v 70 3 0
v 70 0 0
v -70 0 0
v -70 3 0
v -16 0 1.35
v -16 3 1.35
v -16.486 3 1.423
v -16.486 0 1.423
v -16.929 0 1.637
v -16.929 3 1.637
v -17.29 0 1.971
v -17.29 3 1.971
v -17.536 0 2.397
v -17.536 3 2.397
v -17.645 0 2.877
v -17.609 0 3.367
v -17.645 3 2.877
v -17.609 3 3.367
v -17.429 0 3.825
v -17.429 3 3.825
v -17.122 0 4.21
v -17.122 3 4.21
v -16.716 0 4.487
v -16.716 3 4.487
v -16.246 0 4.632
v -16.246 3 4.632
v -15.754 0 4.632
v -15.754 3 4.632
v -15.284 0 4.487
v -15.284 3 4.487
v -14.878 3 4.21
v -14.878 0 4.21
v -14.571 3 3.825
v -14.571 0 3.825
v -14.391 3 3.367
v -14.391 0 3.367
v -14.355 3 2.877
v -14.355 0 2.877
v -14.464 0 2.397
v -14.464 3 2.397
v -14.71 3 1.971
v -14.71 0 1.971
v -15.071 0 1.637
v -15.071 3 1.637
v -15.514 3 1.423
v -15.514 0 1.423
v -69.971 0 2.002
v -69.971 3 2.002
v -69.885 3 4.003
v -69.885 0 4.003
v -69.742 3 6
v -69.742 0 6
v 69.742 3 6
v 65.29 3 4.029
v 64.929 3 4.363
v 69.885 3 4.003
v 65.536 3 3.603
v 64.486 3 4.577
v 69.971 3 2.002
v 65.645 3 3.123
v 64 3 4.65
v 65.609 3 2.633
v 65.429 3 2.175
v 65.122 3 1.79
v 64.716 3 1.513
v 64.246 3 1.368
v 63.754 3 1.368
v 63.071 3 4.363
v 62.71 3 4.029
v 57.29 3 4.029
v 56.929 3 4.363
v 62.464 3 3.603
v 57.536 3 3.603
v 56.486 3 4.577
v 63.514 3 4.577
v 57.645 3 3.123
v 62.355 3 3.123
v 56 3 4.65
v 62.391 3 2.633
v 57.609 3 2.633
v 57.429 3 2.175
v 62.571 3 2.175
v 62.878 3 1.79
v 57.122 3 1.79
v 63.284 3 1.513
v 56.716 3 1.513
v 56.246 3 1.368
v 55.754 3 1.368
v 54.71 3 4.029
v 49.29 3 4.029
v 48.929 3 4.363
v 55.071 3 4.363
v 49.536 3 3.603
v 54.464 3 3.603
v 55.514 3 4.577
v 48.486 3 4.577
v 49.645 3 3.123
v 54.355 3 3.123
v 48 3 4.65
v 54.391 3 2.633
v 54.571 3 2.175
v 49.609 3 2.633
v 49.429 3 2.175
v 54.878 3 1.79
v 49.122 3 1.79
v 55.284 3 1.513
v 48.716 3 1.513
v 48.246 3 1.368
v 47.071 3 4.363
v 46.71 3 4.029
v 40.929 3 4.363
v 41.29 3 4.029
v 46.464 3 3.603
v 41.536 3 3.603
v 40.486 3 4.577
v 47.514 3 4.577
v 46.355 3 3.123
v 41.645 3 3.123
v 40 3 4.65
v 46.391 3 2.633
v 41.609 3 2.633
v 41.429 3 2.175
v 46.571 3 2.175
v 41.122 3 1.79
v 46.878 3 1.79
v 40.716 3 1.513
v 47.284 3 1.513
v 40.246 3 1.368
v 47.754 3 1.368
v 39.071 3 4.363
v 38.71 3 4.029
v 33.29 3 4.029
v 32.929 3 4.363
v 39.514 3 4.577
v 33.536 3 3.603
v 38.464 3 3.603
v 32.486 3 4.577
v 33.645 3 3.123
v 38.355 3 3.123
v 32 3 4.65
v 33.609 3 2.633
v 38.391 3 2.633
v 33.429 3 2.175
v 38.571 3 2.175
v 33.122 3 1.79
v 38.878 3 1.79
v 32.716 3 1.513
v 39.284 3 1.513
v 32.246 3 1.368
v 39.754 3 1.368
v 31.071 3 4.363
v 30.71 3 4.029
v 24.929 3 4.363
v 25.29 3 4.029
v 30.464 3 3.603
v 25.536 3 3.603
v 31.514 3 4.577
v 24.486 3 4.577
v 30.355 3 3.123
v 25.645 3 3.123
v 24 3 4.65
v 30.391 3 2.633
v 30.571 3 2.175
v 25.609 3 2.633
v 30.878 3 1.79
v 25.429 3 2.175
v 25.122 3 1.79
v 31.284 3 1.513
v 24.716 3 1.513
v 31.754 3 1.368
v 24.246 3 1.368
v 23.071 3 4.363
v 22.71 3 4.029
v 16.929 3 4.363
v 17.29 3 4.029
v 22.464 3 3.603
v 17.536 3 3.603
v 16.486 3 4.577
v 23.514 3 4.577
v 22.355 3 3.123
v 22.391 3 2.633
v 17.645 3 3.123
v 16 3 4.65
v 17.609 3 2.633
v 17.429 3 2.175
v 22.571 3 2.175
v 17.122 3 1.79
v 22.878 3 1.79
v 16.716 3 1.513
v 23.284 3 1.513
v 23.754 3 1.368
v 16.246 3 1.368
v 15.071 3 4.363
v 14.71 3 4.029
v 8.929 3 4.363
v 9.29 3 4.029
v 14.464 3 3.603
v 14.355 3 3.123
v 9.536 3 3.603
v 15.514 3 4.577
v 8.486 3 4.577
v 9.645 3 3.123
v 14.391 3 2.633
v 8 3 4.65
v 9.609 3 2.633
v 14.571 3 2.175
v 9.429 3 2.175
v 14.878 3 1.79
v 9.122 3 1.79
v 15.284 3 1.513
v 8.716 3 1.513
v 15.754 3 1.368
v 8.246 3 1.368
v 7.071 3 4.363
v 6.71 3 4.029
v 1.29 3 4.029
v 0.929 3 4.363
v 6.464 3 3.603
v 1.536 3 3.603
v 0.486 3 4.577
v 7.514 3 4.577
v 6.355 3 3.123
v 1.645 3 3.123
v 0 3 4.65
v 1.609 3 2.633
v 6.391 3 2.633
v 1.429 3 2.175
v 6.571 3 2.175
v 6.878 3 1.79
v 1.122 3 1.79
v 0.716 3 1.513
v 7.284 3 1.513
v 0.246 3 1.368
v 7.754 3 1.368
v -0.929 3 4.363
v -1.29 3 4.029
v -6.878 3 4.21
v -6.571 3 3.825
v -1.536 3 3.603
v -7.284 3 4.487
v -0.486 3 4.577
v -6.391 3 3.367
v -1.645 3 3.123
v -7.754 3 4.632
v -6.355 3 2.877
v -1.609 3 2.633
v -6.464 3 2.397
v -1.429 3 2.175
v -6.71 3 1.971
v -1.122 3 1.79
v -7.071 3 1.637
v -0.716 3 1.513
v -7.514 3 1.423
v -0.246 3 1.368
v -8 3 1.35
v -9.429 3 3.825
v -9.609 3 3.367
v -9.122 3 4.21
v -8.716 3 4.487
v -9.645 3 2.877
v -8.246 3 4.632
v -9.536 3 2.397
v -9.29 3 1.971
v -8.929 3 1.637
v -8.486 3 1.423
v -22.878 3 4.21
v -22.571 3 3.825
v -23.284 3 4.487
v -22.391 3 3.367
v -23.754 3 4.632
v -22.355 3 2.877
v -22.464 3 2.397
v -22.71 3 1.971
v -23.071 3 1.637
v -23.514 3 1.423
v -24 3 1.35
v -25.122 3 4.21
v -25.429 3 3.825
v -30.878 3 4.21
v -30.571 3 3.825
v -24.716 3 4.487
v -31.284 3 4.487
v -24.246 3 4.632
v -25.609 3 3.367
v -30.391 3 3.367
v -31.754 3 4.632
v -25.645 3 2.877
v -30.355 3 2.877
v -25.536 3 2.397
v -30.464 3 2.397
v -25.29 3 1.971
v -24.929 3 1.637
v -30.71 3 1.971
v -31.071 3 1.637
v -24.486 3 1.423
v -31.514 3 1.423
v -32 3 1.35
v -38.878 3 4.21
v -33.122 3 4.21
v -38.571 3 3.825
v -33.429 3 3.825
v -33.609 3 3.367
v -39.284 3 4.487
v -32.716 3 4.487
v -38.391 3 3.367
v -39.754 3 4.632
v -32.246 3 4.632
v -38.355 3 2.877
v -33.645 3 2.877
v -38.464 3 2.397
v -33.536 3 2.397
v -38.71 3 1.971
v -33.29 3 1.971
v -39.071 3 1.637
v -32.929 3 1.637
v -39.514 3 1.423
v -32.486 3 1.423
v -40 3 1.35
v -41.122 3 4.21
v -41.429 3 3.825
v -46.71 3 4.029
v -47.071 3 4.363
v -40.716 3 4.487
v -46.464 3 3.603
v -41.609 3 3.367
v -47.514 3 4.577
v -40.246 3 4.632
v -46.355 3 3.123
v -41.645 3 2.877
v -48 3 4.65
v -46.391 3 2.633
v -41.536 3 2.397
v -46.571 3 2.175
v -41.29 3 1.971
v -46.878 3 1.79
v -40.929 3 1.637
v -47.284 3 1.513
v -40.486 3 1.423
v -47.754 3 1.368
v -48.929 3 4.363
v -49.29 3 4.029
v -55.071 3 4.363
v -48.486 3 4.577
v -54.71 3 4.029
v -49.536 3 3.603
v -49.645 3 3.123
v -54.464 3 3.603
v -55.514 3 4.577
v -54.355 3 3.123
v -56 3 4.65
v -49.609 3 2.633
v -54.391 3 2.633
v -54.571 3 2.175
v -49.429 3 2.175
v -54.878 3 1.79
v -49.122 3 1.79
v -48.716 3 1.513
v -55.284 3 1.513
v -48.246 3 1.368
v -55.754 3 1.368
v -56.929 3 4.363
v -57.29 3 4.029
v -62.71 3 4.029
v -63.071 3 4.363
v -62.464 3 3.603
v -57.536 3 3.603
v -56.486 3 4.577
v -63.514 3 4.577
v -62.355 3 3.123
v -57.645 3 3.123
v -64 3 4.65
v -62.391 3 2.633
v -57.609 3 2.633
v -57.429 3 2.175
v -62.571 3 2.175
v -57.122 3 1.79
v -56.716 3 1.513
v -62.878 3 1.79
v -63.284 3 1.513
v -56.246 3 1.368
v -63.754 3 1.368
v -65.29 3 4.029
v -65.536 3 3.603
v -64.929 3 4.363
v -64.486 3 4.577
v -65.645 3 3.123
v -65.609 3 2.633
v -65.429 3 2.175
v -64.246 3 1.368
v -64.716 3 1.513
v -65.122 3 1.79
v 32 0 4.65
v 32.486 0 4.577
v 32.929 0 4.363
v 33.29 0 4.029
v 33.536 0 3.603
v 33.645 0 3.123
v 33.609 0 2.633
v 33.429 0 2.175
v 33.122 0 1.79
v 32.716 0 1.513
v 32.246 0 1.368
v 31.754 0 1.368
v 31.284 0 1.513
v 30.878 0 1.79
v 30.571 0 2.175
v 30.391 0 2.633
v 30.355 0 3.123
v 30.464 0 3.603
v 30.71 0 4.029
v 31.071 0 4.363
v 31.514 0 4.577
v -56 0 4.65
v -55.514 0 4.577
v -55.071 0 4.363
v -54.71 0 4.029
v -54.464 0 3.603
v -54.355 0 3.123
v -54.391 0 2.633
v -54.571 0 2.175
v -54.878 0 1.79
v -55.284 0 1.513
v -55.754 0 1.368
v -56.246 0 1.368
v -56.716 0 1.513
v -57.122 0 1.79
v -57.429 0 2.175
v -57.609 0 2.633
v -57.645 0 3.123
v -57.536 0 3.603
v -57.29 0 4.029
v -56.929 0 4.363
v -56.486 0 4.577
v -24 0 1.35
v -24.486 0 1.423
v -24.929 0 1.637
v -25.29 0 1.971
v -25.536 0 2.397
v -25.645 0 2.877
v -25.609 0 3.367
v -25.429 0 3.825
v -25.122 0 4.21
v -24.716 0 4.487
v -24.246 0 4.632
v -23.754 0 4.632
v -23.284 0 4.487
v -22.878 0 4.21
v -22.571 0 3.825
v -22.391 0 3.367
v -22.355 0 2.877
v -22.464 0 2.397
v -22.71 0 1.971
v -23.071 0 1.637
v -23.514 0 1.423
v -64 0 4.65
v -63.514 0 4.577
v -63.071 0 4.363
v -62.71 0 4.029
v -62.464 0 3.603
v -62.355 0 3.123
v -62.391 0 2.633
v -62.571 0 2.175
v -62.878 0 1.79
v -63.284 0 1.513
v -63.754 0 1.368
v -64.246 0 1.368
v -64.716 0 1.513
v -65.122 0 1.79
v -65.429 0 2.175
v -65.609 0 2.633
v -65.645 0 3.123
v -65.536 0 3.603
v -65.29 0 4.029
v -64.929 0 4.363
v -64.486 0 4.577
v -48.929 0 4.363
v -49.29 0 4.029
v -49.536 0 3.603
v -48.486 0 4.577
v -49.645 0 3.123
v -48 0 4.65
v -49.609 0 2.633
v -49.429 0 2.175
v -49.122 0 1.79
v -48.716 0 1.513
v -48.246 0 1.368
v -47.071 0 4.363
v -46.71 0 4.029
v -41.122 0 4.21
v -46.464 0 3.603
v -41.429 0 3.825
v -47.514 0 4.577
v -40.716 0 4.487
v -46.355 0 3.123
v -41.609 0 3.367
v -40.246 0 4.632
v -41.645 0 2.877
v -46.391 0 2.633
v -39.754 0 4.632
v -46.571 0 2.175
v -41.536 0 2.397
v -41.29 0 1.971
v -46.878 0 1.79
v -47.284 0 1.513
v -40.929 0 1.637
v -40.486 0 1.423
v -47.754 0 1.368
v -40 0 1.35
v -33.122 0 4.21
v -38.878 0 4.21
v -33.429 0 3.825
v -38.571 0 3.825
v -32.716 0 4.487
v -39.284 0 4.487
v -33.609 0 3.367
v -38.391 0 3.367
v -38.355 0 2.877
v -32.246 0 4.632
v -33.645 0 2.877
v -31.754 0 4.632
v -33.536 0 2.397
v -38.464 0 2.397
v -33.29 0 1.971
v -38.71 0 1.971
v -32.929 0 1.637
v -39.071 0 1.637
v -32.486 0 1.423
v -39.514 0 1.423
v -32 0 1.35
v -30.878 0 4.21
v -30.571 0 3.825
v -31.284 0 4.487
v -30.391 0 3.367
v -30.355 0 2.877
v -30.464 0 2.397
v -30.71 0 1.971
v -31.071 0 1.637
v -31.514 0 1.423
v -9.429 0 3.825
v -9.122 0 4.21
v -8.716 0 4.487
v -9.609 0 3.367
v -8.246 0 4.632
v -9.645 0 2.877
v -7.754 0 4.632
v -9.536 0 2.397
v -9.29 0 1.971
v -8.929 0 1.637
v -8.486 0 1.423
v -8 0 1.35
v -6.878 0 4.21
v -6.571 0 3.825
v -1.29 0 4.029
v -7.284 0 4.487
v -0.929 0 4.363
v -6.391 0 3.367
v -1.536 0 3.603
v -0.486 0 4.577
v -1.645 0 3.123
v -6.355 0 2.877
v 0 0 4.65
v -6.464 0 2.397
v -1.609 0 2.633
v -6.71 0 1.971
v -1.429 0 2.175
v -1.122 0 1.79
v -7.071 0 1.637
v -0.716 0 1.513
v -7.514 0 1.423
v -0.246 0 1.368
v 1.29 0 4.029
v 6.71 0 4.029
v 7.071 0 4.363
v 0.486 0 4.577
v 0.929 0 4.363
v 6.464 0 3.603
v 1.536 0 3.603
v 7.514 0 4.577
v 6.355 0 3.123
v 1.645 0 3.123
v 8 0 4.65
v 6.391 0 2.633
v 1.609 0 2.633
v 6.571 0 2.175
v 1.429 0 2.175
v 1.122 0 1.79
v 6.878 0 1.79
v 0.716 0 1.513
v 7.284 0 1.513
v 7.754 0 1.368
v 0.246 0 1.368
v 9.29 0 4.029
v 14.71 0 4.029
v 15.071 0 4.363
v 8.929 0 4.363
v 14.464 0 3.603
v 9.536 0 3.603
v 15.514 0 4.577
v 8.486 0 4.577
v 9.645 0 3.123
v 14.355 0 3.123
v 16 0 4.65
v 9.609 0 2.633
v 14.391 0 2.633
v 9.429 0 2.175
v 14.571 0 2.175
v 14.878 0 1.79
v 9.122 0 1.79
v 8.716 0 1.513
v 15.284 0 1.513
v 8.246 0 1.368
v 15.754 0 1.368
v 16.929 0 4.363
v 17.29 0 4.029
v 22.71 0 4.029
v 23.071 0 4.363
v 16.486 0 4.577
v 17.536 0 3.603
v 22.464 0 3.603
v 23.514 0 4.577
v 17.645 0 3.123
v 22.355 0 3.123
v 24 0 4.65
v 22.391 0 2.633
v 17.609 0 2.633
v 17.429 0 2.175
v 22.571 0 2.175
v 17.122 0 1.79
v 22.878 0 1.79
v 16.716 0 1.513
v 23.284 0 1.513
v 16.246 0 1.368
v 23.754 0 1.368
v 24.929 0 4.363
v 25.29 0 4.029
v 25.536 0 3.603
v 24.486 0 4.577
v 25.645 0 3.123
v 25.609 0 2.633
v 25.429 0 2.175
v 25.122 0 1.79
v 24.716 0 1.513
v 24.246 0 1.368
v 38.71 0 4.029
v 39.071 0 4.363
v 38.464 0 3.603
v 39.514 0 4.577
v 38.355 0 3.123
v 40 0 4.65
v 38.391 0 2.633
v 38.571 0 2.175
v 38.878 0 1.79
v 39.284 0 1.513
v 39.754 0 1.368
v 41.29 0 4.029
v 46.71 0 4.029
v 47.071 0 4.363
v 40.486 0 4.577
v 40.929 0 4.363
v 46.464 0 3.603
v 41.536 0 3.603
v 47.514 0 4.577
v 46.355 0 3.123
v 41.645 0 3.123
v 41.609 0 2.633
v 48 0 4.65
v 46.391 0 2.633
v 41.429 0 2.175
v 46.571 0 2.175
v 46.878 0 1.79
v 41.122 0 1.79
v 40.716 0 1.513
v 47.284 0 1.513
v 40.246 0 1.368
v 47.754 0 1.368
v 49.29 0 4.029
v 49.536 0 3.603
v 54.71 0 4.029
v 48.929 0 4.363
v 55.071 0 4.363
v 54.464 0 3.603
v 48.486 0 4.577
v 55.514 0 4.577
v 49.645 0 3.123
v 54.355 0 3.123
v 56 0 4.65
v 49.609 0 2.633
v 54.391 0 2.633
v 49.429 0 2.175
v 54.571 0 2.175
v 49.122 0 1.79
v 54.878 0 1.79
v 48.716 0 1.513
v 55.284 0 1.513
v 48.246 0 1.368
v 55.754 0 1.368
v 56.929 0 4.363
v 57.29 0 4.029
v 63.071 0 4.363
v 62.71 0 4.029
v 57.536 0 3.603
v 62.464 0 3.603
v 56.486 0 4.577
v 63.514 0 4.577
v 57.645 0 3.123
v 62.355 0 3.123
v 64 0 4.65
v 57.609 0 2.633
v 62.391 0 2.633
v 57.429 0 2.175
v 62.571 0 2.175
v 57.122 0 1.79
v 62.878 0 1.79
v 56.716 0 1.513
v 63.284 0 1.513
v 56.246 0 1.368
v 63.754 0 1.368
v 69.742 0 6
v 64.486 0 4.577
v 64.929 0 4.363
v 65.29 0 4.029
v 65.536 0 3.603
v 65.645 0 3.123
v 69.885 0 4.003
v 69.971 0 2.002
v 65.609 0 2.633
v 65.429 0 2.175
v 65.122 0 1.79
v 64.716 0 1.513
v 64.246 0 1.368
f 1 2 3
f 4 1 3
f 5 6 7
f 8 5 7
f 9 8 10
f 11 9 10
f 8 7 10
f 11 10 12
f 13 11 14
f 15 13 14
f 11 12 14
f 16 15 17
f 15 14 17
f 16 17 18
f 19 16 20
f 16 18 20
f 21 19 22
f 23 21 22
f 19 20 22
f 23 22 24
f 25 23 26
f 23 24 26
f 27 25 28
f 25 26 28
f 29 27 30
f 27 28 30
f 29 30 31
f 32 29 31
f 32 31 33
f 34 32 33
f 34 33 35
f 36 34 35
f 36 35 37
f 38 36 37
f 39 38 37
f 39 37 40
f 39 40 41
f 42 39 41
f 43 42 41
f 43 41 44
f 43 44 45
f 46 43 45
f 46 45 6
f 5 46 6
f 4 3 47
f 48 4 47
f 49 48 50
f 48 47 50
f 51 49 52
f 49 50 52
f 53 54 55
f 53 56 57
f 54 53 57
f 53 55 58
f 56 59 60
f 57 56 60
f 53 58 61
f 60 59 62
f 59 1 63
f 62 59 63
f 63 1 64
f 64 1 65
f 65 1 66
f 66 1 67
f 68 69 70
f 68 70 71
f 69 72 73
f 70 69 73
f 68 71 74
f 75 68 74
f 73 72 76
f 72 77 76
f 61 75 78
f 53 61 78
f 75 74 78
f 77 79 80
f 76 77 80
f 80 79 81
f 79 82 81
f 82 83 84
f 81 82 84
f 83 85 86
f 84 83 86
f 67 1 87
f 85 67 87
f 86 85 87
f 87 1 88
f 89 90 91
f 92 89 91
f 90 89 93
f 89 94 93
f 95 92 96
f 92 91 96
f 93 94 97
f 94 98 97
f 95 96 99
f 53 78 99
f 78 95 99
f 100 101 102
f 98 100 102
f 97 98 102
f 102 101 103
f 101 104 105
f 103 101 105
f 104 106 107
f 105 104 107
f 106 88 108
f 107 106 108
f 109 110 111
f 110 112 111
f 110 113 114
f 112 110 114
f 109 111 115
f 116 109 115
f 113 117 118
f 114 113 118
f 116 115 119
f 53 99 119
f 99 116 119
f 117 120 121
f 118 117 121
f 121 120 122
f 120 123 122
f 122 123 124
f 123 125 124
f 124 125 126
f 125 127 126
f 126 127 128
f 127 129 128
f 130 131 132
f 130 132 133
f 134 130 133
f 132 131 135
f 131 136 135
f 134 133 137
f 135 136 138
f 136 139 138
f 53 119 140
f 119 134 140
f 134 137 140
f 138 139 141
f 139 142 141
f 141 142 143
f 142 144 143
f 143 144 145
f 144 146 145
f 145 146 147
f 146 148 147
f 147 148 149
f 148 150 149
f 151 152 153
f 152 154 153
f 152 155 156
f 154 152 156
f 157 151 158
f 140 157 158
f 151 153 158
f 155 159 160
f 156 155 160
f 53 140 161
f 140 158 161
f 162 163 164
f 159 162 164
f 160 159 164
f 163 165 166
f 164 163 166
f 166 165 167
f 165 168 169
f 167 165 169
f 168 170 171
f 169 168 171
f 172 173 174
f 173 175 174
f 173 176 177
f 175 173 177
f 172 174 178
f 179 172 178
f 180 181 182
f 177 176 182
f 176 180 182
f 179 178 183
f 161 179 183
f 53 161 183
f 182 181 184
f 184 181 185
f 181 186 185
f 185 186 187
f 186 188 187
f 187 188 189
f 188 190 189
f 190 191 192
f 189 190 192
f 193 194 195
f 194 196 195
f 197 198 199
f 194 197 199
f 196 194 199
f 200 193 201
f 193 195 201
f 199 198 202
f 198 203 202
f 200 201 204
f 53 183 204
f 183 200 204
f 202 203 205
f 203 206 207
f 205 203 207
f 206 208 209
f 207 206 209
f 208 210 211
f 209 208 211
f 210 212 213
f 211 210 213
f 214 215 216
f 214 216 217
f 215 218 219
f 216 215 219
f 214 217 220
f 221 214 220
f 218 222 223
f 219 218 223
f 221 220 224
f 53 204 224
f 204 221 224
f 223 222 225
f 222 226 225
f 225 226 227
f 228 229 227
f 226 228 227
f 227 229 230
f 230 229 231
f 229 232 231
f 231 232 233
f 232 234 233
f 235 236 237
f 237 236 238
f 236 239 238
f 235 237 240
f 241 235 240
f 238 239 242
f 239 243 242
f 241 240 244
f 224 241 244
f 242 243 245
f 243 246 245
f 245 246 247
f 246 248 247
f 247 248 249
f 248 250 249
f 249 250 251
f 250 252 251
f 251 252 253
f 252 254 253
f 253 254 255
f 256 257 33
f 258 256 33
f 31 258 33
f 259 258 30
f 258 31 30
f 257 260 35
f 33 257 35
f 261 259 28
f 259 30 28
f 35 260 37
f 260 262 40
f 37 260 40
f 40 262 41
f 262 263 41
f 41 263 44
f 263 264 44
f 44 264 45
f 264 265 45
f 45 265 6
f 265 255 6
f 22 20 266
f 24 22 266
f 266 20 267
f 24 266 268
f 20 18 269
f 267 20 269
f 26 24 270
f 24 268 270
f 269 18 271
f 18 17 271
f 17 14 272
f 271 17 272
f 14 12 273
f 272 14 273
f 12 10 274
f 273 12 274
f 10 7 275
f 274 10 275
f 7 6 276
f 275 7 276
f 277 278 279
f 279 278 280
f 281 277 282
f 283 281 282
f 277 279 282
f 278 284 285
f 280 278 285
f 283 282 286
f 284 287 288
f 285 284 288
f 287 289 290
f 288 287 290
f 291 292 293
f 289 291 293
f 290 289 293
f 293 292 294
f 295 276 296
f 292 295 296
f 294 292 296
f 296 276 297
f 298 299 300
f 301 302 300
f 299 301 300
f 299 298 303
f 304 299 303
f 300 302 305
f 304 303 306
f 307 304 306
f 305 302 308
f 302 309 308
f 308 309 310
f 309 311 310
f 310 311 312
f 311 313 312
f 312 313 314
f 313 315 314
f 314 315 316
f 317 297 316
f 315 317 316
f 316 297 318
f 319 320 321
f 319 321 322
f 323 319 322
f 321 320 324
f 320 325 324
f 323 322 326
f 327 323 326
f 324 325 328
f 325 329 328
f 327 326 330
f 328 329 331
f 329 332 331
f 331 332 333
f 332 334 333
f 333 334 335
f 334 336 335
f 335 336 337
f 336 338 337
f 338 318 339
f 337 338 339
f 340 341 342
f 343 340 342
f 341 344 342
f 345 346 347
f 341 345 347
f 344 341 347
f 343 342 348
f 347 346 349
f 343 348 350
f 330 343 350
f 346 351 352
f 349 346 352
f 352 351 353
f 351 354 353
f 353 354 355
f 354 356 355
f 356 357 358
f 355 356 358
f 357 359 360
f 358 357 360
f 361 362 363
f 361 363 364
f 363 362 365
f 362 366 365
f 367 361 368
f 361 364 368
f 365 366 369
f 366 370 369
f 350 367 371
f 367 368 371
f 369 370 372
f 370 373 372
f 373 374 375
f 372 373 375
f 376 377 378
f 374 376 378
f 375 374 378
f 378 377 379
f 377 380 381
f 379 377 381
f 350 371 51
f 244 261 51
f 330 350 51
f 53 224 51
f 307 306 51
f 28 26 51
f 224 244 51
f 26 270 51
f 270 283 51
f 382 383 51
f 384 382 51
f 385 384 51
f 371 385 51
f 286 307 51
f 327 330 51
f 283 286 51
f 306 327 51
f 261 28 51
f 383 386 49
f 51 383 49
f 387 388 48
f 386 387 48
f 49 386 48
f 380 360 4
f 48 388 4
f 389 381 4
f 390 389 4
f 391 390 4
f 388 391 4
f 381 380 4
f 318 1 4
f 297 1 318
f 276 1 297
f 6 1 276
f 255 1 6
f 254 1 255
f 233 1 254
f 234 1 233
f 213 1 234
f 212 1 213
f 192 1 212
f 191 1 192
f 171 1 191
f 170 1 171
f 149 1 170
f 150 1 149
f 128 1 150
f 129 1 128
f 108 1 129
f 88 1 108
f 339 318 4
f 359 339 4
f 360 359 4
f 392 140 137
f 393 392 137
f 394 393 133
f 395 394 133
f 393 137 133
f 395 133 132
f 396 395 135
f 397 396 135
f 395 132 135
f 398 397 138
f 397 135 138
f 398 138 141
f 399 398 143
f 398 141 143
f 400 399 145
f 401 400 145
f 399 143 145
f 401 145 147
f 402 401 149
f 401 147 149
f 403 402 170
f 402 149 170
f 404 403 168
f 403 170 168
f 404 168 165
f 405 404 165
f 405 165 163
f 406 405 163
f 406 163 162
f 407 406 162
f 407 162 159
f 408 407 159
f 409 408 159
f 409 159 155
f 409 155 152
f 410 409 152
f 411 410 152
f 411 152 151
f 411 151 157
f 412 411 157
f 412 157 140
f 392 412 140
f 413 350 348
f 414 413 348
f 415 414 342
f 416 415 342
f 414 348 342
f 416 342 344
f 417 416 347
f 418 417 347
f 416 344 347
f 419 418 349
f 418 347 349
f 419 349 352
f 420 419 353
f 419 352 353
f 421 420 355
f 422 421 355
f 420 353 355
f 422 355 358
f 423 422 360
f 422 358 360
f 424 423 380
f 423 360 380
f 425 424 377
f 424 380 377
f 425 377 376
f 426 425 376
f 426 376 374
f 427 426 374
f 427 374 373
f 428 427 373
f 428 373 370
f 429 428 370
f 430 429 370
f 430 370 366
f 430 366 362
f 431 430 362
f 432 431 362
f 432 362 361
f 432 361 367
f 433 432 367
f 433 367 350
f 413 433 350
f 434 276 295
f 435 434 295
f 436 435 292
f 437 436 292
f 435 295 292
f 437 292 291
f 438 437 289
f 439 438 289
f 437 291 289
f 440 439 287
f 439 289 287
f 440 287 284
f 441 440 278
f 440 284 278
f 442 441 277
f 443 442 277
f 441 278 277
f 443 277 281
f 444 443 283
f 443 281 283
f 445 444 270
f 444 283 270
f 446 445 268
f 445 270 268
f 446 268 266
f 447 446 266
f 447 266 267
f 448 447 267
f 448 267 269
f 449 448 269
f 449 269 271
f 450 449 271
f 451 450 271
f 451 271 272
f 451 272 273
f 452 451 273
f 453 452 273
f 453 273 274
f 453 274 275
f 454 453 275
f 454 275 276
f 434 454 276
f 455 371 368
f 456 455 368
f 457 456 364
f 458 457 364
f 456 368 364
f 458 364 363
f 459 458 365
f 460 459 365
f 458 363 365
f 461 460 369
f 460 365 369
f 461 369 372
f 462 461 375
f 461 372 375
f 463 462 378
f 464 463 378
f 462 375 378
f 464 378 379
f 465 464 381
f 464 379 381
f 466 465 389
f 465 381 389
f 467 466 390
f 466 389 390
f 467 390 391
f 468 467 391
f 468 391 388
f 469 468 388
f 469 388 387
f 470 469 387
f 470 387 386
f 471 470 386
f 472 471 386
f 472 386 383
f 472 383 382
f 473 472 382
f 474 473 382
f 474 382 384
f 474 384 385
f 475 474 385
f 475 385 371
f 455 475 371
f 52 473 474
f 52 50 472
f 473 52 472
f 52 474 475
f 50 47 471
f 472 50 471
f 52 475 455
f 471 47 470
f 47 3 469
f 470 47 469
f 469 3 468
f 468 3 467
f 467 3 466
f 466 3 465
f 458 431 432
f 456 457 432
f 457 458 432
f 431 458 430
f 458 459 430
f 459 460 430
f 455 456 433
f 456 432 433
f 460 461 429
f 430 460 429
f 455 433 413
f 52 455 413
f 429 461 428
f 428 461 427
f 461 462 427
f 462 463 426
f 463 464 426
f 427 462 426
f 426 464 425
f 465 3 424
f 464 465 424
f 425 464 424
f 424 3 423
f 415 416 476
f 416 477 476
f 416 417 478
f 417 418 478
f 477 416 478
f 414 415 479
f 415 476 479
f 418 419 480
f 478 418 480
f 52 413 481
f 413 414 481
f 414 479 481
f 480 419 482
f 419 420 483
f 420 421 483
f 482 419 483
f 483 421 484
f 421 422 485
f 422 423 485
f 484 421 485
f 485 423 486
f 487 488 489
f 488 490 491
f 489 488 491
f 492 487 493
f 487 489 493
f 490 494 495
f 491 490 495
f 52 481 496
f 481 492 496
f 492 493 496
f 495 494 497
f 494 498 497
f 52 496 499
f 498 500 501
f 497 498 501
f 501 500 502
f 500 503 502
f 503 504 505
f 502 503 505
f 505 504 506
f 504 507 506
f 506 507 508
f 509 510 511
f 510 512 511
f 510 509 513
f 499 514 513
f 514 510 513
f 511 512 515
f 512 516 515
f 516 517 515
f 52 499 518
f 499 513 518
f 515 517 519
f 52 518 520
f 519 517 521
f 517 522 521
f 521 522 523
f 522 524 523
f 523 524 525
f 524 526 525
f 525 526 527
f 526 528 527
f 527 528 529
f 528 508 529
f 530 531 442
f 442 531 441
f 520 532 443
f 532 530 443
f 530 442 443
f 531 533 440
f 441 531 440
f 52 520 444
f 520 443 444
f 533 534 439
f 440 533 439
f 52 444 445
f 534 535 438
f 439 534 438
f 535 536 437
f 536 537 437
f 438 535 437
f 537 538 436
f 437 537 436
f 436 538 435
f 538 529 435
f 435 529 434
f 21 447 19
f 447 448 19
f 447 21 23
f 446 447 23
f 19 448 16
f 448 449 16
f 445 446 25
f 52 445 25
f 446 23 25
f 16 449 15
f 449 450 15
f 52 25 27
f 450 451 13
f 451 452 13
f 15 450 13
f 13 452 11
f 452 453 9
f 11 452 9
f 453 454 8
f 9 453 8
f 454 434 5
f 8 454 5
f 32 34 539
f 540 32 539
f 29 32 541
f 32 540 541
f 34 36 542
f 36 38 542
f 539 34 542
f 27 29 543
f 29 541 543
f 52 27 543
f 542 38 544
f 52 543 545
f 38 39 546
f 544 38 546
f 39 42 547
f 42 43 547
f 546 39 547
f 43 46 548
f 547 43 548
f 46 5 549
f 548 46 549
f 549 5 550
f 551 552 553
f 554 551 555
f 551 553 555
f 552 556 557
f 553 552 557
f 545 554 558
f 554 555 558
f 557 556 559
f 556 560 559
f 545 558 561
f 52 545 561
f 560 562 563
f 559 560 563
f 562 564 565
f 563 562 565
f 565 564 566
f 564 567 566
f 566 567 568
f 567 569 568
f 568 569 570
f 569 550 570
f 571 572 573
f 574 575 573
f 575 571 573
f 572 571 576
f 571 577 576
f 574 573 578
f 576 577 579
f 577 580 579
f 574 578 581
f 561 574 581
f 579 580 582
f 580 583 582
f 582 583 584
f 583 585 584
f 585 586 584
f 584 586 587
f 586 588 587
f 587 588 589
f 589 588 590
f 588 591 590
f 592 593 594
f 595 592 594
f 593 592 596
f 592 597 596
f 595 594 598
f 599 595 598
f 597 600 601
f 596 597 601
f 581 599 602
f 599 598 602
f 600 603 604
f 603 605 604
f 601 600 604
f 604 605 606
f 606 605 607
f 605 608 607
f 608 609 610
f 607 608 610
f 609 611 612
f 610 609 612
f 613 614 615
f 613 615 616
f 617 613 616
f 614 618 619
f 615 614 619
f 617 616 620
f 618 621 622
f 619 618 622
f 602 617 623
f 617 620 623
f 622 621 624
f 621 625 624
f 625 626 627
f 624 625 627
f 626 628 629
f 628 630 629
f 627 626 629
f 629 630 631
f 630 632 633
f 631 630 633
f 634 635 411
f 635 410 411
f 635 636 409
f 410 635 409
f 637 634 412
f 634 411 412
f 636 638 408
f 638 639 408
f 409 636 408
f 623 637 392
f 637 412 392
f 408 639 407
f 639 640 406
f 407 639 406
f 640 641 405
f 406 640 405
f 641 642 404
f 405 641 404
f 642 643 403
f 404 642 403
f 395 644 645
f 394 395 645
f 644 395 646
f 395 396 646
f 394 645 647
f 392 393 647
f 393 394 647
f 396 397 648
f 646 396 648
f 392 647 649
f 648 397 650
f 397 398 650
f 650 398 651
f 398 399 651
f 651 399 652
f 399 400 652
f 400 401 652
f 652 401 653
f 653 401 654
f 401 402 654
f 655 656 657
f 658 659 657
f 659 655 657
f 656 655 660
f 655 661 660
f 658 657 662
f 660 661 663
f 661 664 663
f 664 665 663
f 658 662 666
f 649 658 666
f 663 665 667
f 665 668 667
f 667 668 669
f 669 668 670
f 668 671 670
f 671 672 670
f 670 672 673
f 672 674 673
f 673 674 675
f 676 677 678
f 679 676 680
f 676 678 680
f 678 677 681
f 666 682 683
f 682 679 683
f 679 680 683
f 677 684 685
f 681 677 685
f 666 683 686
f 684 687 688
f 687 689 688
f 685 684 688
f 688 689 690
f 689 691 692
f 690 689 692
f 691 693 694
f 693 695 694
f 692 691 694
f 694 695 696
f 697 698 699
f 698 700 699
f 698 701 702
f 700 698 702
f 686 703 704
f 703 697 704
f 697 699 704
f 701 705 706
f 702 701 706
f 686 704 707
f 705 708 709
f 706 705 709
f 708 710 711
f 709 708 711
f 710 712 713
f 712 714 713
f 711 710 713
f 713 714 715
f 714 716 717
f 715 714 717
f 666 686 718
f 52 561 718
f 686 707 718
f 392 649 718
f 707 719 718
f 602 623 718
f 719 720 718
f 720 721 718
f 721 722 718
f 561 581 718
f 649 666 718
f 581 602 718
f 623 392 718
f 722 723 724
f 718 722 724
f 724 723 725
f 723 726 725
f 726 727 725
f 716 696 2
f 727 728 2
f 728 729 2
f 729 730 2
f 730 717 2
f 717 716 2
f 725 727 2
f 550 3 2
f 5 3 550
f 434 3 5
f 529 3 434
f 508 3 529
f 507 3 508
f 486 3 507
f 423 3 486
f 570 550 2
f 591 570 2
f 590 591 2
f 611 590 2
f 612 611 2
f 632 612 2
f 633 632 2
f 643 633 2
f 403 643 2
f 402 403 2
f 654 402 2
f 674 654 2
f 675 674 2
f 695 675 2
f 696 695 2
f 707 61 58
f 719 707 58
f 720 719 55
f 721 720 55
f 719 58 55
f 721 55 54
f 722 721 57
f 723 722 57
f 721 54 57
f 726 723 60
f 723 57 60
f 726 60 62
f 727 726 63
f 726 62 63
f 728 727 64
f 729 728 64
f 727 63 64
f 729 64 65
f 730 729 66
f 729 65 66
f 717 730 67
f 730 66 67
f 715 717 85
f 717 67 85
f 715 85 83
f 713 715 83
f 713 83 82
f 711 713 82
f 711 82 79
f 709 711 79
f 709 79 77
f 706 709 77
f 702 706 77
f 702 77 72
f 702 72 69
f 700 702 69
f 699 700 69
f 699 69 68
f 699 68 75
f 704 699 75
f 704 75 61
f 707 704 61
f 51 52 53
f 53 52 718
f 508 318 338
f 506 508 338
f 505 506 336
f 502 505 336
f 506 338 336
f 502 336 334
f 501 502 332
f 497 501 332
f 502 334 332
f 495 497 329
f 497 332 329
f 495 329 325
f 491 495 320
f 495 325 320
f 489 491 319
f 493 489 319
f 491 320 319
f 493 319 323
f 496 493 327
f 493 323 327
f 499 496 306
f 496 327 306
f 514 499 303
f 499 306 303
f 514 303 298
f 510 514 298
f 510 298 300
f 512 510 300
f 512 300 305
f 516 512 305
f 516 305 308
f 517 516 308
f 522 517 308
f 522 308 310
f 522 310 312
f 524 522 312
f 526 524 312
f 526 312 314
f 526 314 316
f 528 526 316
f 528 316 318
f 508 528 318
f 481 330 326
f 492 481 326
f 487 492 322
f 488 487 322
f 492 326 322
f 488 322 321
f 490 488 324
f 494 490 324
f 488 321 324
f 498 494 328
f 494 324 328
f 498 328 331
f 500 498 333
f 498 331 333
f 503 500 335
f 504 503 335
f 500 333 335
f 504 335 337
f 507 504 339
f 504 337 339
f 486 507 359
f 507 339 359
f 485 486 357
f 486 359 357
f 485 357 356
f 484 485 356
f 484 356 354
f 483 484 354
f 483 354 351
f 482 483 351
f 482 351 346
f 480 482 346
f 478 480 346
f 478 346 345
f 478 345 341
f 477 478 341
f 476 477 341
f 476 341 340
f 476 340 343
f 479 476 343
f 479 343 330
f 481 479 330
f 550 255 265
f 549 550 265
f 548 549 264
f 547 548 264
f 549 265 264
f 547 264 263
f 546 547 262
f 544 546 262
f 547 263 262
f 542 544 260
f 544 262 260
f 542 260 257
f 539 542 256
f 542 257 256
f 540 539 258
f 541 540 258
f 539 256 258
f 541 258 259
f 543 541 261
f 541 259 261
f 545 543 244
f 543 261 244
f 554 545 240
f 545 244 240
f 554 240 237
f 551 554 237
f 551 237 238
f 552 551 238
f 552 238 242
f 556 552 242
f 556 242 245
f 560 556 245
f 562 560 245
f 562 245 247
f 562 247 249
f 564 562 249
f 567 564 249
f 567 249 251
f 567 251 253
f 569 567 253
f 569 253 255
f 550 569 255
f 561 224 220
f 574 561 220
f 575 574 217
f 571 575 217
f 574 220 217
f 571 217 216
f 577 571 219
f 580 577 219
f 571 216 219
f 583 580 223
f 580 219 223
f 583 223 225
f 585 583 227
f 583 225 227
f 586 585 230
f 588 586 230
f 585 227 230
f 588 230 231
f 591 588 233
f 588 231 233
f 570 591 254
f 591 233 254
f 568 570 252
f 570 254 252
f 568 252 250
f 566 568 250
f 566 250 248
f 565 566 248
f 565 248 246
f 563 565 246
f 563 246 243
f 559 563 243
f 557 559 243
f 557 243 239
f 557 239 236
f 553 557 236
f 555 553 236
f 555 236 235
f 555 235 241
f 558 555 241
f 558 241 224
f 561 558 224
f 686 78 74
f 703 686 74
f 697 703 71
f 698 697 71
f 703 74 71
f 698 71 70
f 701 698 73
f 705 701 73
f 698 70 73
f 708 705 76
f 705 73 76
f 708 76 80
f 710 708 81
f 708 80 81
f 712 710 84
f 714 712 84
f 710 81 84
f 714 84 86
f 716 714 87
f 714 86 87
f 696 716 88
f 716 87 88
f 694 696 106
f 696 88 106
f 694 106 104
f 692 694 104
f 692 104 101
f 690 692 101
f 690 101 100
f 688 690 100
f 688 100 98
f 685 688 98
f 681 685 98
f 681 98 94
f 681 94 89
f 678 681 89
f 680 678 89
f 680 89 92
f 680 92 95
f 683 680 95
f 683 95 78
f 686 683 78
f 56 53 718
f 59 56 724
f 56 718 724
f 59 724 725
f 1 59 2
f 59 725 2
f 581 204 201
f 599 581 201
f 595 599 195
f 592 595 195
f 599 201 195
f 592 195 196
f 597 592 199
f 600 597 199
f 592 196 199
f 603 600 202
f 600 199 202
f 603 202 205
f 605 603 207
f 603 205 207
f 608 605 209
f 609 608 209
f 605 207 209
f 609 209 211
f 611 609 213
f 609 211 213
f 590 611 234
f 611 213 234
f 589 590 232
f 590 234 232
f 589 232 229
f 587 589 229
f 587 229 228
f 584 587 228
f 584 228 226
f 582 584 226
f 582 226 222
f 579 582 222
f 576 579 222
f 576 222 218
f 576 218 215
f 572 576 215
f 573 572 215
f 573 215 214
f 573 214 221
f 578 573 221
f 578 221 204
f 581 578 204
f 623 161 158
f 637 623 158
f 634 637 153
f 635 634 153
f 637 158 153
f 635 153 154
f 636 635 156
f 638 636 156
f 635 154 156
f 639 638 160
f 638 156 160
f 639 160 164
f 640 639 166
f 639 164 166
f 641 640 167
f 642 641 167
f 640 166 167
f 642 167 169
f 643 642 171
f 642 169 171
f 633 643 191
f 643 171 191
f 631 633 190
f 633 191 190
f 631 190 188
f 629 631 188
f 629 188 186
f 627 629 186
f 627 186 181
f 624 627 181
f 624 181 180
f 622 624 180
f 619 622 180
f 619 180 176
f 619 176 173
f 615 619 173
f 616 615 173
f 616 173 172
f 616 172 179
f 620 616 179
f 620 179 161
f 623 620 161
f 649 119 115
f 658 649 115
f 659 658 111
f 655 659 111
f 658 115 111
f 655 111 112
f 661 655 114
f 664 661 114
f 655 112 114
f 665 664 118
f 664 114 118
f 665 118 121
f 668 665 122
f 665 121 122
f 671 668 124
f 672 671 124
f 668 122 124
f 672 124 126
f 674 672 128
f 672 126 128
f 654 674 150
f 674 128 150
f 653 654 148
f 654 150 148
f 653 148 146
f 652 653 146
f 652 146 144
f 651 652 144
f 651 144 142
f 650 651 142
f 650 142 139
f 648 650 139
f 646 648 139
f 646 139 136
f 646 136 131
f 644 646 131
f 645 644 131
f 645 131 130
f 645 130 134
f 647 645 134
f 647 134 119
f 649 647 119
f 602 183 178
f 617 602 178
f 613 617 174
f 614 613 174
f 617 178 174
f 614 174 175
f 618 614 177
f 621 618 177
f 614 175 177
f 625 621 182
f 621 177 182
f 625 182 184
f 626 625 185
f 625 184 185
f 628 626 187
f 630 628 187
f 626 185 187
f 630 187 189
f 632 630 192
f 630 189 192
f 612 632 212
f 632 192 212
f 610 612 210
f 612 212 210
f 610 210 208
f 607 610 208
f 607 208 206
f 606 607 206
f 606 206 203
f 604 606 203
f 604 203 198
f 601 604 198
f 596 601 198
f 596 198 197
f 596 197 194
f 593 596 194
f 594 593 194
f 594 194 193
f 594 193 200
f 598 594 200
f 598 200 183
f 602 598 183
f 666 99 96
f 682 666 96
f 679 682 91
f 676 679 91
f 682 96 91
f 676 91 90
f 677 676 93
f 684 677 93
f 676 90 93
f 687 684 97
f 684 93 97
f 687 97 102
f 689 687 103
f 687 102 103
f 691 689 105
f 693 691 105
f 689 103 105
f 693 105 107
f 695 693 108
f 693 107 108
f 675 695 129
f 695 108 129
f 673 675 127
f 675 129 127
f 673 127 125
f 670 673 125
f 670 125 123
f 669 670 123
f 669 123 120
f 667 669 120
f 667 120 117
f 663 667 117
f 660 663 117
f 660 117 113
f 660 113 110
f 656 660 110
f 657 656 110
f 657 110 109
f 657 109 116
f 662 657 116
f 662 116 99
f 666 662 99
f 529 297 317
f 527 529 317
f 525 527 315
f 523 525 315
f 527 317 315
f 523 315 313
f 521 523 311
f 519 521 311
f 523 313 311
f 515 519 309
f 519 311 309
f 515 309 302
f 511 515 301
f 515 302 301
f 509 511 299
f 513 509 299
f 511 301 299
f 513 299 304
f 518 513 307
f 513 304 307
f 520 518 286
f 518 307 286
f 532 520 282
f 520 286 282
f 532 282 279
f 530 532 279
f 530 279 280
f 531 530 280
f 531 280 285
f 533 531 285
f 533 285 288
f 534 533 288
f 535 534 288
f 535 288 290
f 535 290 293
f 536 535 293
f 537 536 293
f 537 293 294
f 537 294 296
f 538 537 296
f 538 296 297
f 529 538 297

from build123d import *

# Parameters (mm, degrees)
EXTRUDE_1_DEPTH     = 4
CUT_EXTRUDE_1_DEPTH = 10
SKETCH_3_R          = 2.25
CUT_EXTRUDE_2_DEPTH = 10
SKETCH_4_R          = 1.65
CUT_EXTRUDE_3_DEPTH = 10
EXTRUDE_START       = -4
EXTRUDE_2_DEPTH     = 4
SKETCH_6_R          = 1.65
CUT_EXTRUDE_4_DEPTH = 4
SKETCH_7_W          = 40
SKETCH_7_H          = 10
CUT_EXTRUDE_5_DEPTH = 4
EXTRUDE_4_DEPTH     = 4
SKETCH_9_R          = 1.65
SKETCH_9_R_2        = 2.25
SKETCH_9_W          = 20
SKETCH_9_H          = 40
EXTRUDE_7_DEPTH     = 4
CUT_EXTRUDE_START   = -4
SKETCH_10_R         = 2.25
SKETCH_10_W         = 20
SKETCH_10_H         = 40
CUT_EXTRUDE_6_DEPTH = 4
SKETCH_11_R         = 2.25
SKETCH_11_W         = 20
SKETCH_11_H         = 40
SKETCH_11_W_2       = 40
SKETCH_11_H_2       = 20
SKETCH_11_R_2       = 1.65
CUT_EXTRUDE_7_DEPTH = 4
SKETCH_12_W         = 140
SKETCH_12_H         = 1
CUT_EXTRUDE_8_DEPTH = 10


with BuildPart() as part:
    # 草图1 → 凸台-拉伸1 (new body)
    with BuildSketch(Plane(origin=(0, 0, 0), x_dir=(1, 0, 0), z_dir=(0, 1, 0))):
        with BuildLine():
            Line((-50, 0), (50, 0))
            ThreePointArc((50, 0), (0, -50), (-50, 0))
        make_face()
    extrude(amount=EXTRUDE_1_DEPTH)

    # 草图2 → 切除-拉伸1 (cut)
    with BuildSketch(Plane(origin=(0, 4, 0), x_dir=(1, 0, 0), z_dir=(0, 1, 0))):
        Polygon((0, -10.623043888), (10, -10.623043888), (10, -30.623043888), (-30, -30.623043888), (-30, -10.623043888), align=None)
    extrude(amount=-CUT_EXTRUDE_1_DEPTH, mode=Mode.SUBTRACT)

    # 草图3 → 切除-拉伸2 (cut)
    with BuildSketch(Plane(origin=(0, 4, 0), x_dir=(1, 0, 0), z_dir=(0, 1, 0))):
        with Locations(Location((-34.75, -15.623043888, 0), (0, 0, 270))):
            Circle(SKETCH_3_R)
        with Locations(Location((-34.75, -25.623043888, 0), (0, 0, 270))):
            Circle(SKETCH_3_R)
        with Locations(Location((14.75, -25.623043888, 0), (0, 0, 90))):
            Circle(SKETCH_3_R)
        with Locations(Location((14.75, -15.623043888, 0), (0, 0, 90))):
            Circle(SKETCH_3_R)
    extrude(amount=-CUT_EXTRUDE_2_DEPTH, mode=Mode.SUBTRACT)

    # 草图4 → 切除-拉伸3 (cut)
    with BuildSketch(Plane(origin=(0, 4, 0), x_dir=(1, 0, 0), z_dir=(0, 1, 0))):
        with Locations(Location((0, -3, 0), (0, 0, 270))):
            Circle(SKETCH_4_R)
        with Locations(Location((8, -3, 0), (0, 0, 270))):
            Circle(SKETCH_4_R)
        with Locations(Location((16, -3, 0), (0, 0, 270))):
            Circle(SKETCH_4_R)
        with Locations(Location((24, -3, 0), (0, 0, 270))):
            Circle(SKETCH_4_R)
        with Locations(Location((32, -3, 0), (0, 0, 270))):
            Circle(SKETCH_4_R)
        with Locations(Location((40, -3, 0), (0, 0, 270))):
            Circle(SKETCH_4_R)
        with Locations(Location((-40, -3, 0), (0, 0, 90))):
            Circle(SKETCH_4_R)
        with Locations(Location((-32, -3, 0), (0, 0, 90))):
            Circle(SKETCH_4_R)
        with Locations(Location((-24, -3, 0), (0, 0, 90))):
            Circle(SKETCH_4_R)
        with Locations(Location((-16, -3, 0), (0, 0, 90))):
            Circle(SKETCH_4_R)
        with Locations(Location((-8, -3, 0), (0, 0, 90))):
            Circle(SKETCH_4_R)
    extrude(amount=-CUT_EXTRUDE_3_DEPTH, mode=Mode.SUBTRACT)

    # 草图5 → 凸台-拉伸2 (add)
    with BuildSketch(Plane(origin=(0, 4, 0), x_dir=(1, 0, 0), z_dir=(0, 1, 0)).offset(EXTRUDE_START)):
        with BuildLine():
            Line((-50, 0), (-70, 0))
            ThreePointArc((-70, 0), (0, -70), (70, 0))
            Line((70, 0), (50, 0))
            ThreePointArc((50, 0), (0, -50), (-50, 0))
        make_face()
    extrude(amount=EXTRUDE_2_DEPTH)

    # 草图6 → 切除-拉伸4 (cut)
    with BuildSketch(Plane(origin=(0, 4, 0), x_dir=(1, 0, 0), z_dir=(0, 1, 0))):
        with Locations(Location((0, -3, 0), (0, 0, 270))):
            Circle(SKETCH_6_R)
        with Locations(Location((8, -3, 0), (0, 0, 270))):
            Circle(SKETCH_6_R)
        with Locations(Location((16, -3, 0), (0, 0, 270))):
            Circle(SKETCH_6_R)
        with Locations(Location((24, -3, 0), (0, 0, 270))):
            Circle(SKETCH_6_R)
        with Locations(Location((32, -3, 0), (0, 0, 270))):
            Circle(SKETCH_6_R)
        with Locations(Location((40, -3, 0), (0, 0, 270))):
            Circle(SKETCH_6_R)
        with Locations(Location((48, -3, 0), (0, 0, 270))):
            Circle(SKETCH_6_R)
        with Locations(Location((56, -3, 0), (0, 0, 270))):
            Circle(SKETCH_6_R)
        with Locations(Location((64, -3, 0), (0, 0, 270))):
            Circle(SKETCH_6_R)
        with Locations(Location((-8, -3, 0), (0, 0, 90))):
            Circle(SKETCH_6_R)
        with Locations(Location((-16, -3, 0), (0, 0, 90))):
            Circle(SKETCH_6_R)
        with Locations(Location((-24, -3, 0), (0, 0, 90))):
            Circle(SKETCH_6_R)
        with Locations(Location((-32, -3, 0), (0, 0, 90))):
            Circle(SKETCH_6_R)
        with Locations(Location((-40, -3, 0), (0, 0, 90))):
            Circle(SKETCH_6_R)
        with Locations(Location((-48, -3, 0), (0, 0, 270))):
            Circle(SKETCH_6_R)
        with Locations(Location((-56, -3, 0), (0, 0, 270))):
            Circle(SKETCH_6_R)
        with Locations(Location((-64, -3, 0), (0, 0, 270))):
            Circle(SKETCH_6_R)
    extrude(amount=-CUT_EXTRUDE_4_DEPTH, mode=Mode.SUBTRACT)

    # 草图7 → 切除-拉伸5 (cut)
    with BuildSketch(Plane(origin=(0, 4, 0), x_dir=(1, 0, 0), z_dir=(0, 1, 0))):
        with Locations((-10, -25.623043888)):
            Rectangle(SKETCH_7_W, SKETCH_7_H)
        with Locations((-10, -35.623043888)):
            Rectangle(SKETCH_7_W, SKETCH_7_H)
        with BuildLine():
            ThreePointArc((17, -35.623043888), (16.340990258, -34.03205363), (14.75, -33.373043888))
            ThreePointArc((14.75, -33.373043888), (13.159009742, -37.214034146), (17, -35.623043888))
        make_face()
        with BuildLine():
            ThreePointArc((-32.5, -35.623043888), (-33.159009742, -34.03205363), (-34.75, -33.373043888))
            ThreePointArc((-34.75, -33.373043888), (-36.340990258, -37.214034146), (-32.5, -35.623043888))
        make_face()
    extrude(amount=-CUT_EXTRUDE_5_DEPTH, mode=Mode.SUBTRACT)

    # 草图8 → 凸台-拉伸4 (add)
    with BuildSketch(Plane(origin=(0, 4, 0), x_dir=(1, 0, 0), z_dir=(0, 1, 0))):
        Polygon((-41.554882874, -20.623043888), (14.75, -20.623043888), (21.040870392, -20.623043888), (21.040870392, -8.98726117), (-41.554882874, -8.5063719), align=None)
    extrude(amount=-EXTRUDE_4_DEPTH)

    # 草图9 → 凸台-拉伸7 (add)
    # profile 1 of 2: a face of its own
    with BuildSketch(Plane(origin=(0, 4, 0), x_dir=(1, 0, 0), z_dir=(0, 1, 0)).offset(EXTRUDE_START)):
        with BuildLine():
            ThreePointArc((-80, -150), (-26.806171238, -125.50183053), (-10.845240526, -69.154759474))
            ThreePointArc((-10.845240526, -69.154759474), (-49.497474683, -49.497474683), (-69.154759474, -10.845240526))
            ThreePointArc((-69.154759474, -10.845240526), (-74.560935889, -10.211630041), (-80, -10))
            Line((-80, -10), (-80, -150))
        make_face()
        with Locations(Location((-77, -144, 0), (0, 0, 270))):
            Circle(SKETCH_9_R, mode=Mode.SUBTRACT)
        with Locations(Location((-77, -136, 0), (0, 0, 270))):
            Circle(SKETCH_9_R, mode=Mode.SUBTRACT)
        with Locations(Location((-77, -128, 0), (0, 0, 270))):
            Circle(SKETCH_9_R, mode=Mode.SUBTRACT)
        with Locations(Location((-77, -120, 0), (0, 0, 270))):
            Circle(SKETCH_9_R, mode=Mode.SUBTRACT)
        with Locations(Location((-54.376956112, -114.75, 0), (0, 0, 270))):
            Circle(SKETCH_9_R_2, mode=Mode.SUBTRACT)
        with Locations(Location((-44.376956112, -114.75, 0), (0, 0, 270))):
            Circle(SKETCH_9_R_2, mode=Mode.SUBTRACT)
        with Locations(Location((-77, -112, 0), (0, 0, 270))):
            Circle(SKETCH_9_R, mode=Mode.SUBTRACT)
        with Locations(Location((-77, -104, 0), (0, 0, 270))):
            Circle(SKETCH_9_R, mode=Mode.SUBTRACT)
        with Locations(Location((-77, -96, 0), (0, 0, 270))):
            Circle(SKETCH_9_R, mode=Mode.SUBTRACT)
        with Locations(Location((-77, -88, 0), (0, 0, 270))):
            Circle(SKETCH_9_R, mode=Mode.SUBTRACT)
        with Locations(Location((-77, -80, 0), (0, 0, 270))):
            Circle(SKETCH_9_R, mode=Mode.SUBTRACT)
        with Locations((-49.376956112, -90)):
            Rectangle(SKETCH_9_W, SKETCH_9_H, mode=Mode.SUBTRACT)
        with Locations(Location((-77, -72, 0), (0, 0, 270))):
            Circle(SKETCH_9_R, mode=Mode.SUBTRACT)
        with Locations(Location((-77, -64, 0), (0, 0, 270))):
            Circle(SKETCH_9_R, mode=Mode.SUBTRACT)
        with Locations(Location((-54.376956112, -65.25, 0), (0, 0, 270))):
            Circle(SKETCH_9_R_2, mode=Mode.SUBTRACT)
        with Locations(Location((-44.376956112, -65.25, 0), (0, 0, 270))):
            Circle(SKETCH_9_R_2, mode=Mode.SUBTRACT)
        with Locations(Location((-77, -56, 0), (0, 0, 270))):
            Circle(SKETCH_9_R, mode=Mode.SUBTRACT)
        with Locations(Location((-77, -48, 0), (0, 0, 270))):
            Circle(SKETCH_9_R, mode=Mode.SUBTRACT)
        with Locations(Location((-77, -40, 0), (0, 0, 270))):
            Circle(SKETCH_9_R, mode=Mode.SUBTRACT)
        with Locations(Location((-77, -32, 0), (0, 0, 270))):
            Circle(SKETCH_9_R, mode=Mode.SUBTRACT)
        with Locations(Location((-77, -24, 0), (0, 0, 270))):
            Circle(SKETCH_9_R, mode=Mode.SUBTRACT)
        with Locations(Location((-77, -16, 0), (0, 0, 270))):
            Circle(SKETCH_9_R, mode=Mode.SUBTRACT)
    # profile 2 of 2: a face of its own
    with BuildSketch(Plane(origin=(0, 4, 0), x_dir=(1, 0, 0), z_dir=(0, 1, 0)).offset(EXTRUDE_START)):
        with BuildLine():
            ThreePointArc((39.376956112, -57.874479068), (25.73671386, -65.097016519), (10.845240526, -69.154759474))
            ThreePointArc((10.845240526, -69.154759474), (26.806171238, -125.50183053), (80, -150))
            Line((80, -150), (80, -80))
            Line((80, -80), (80, -10))
            ThreePointArc((80, -10), (74.560935889, -10.211630041), (69.154759474, -10.845240526))
            ThreePointArc((69.154759474, -10.845240526), (64.206635613, -27.883829422), (55.133596526, -43.131039103))
            ThreePointArc((55.133596526, -43.131039103), (56.106456706, -46.689210789), (52.430746339, -46.379056031))
            ThreePointArc((52.430746339, -46.379056031), (50.742579289, -48.220230683), (48.989794856, -50))
            Line((48.989794856, -50), (59.376956112, -50))
            Line((59.376956112, -50), (59.376956112, -90))
            Line((59.376956112, -90), (39.376956112, -90))
            Line((39.376956112, -90), (39.376956112, -57.874479068))
        make_face()
        with Locations(Location((77, -144, 0), (0, 0, 270))):
            Circle(SKETCH_9_R, mode=Mode.SUBTRACT)
        with Locations(Location((77, -136, 0), (0, 0, 270))):
            Circle(SKETCH_9_R, mode=Mode.SUBTRACT)
        with Locations(Location((77, -128, 0), (0, 0, 270))):
            Circle(SKETCH_9_R, mode=Mode.SUBTRACT)
        with Locations(Location((77, -120, 0), (0, 0, 270))):
            Circle(SKETCH_9_R, mode=Mode.SUBTRACT)
        with Locations(Location((44.376956112, -94.75, 0), (0, 0, 270))):
            Circle(SKETCH_9_R_2, mode=Mode.SUBTRACT)
        with Locations(Location((54.376956112, -94.75, 0), (0, 0, 270))):
            Circle(SKETCH_9_R_2, mode=Mode.SUBTRACT)
        with Locations(Location((77, -112, 0), (0, 0, 270))):
            Circle(SKETCH_9_R, mode=Mode.SUBTRACT)
        with Locations(Location((77, -104, 0), (0, 0, 270))):
            Circle(SKETCH_9_R, mode=Mode.SUBTRACT)
        with Locations(Location((77, -96, 0), (0, 0, 270))):
            Circle(SKETCH_9_R, mode=Mode.SUBTRACT)
        with Locations(Location((77, -88, 0), (0, 0, 270))):
            Circle(SKETCH_9_R, mode=Mode.SUBTRACT)
        with Locations(Location((77, -80, 0), (0, 0, 270))):
            Circle(SKETCH_9_R, mode=Mode.SUBTRACT)
        with Locations(Location((77, -72, 0), (0, 0, 270))):
            Circle(SKETCH_9_R, mode=Mode.SUBTRACT)
        with Locations(Location((77, -64, 0), (0, 0, 270))):
            Circle(SKETCH_9_R, mode=Mode.SUBTRACT)
        with Locations(Location((77, -56, 0), (0, 0, 270))):
            Circle(SKETCH_9_R, mode=Mode.SUBTRACT)
        with Locations(Location((77, -48, 0), (0, 0, 270))):
            Circle(SKETCH_9_R, mode=Mode.SUBTRACT)
        with Locations(Location((77, -40, 0), (0, 0, 270))):
            Circle(SKETCH_9_R, mode=Mode.SUBTRACT)
        with Locations(Location((77, -32, 0), (0, 0, 270))):
            Circle(SKETCH_9_R, mode=Mode.SUBTRACT)
        with Locations(Location((77, -24, 0), (0, 0, 270))):
            Circle(SKETCH_9_R, mode=Mode.SUBTRACT)
        with Locations(Location((77, -16, 0), (0, 0, 270))):
            Circle(SKETCH_9_R, mode=Mode.SUBTRACT)
    extrude(amount=EXTRUDE_7_DEPTH)

    # 草图10 → 切除-拉伸6 (cut)
    with BuildSketch(Plane(origin=(0, 4, 0), x_dir=(1, 0, 0), z_dir=(0, 1, 0)).offset(CUT_EXTRUDE_START)):
        with Locations(Location((54.376956112, -45.25, 0), (0, 0, 270))):
            Circle(SKETCH_10_R)
        with Locations(Location((44.376956112, -45.25, 0), (0, 0, 270))):
            Circle(SKETCH_10_R)
        with Locations((49.376956112, -70)):
            Rectangle(SKETCH_10_W, SKETCH_10_H)
    extrude(amount=CUT_EXTRUDE_6_DEPTH, mode=Mode.SUBTRACT)

    # 草图11 → 切除-拉伸7 (cut)
    with BuildSketch(Plane.XZ):
        with BuildLine():
            ThreePointArc((-69.154759474, 10.845240526), (-69.490813368, 8.42774332), (-69.742383097, 6))
            Line((-69.742383097, 6), (69.742383097, 6))
            ThreePointArc((69.742383097, 6), (69.490813368, 8.42774332), (69.154759474, 10.845240526))
            ThreePointArc((69.154759474, 10.845240526), (74.560935889, 10.211630041), (80, 10))
            Line((80, 10), (80, 150))
            ThreePointArc((80, 150), (26.806171238, 125.50183053), (10.845240526, 69.154759474))
            ThreePointArc((10.845240526, 69.154759474), (0, 70), (-10.845240526, 69.154759474))
            ThreePointArc((-10.845240526, 69.154759474), (-26.806171238, 125.50183053), (-80, 150))
            Line((-80, 150), (-80, 10))
            ThreePointArc((-80, 10), (-74.560935889, 10.211630041), (-69.154759474, 10.845240526))
        make_face()
        with Locations((54.376956112, 45.25)):
            Circle(SKETCH_11_R, mode=Mode.SUBTRACT)
        with Locations((49.376956112, 70)):
            Rectangle(SKETCH_11_W, SKETCH_11_H, mode=Mode.SUBTRACT)
        with Locations((-34.75, 25.623043888)):
            Circle(SKETCH_11_R, mode=Mode.SUBTRACT)
        with Locations((-34.75, 35.623043888)):
            Circle(SKETCH_11_R, mode=Mode.SUBTRACT)
        with Locations((-10, 30.623043888)):
            Rectangle(SKETCH_11_W_2, SKETCH_11_H_2, mode=Mode.SUBTRACT)
        with Locations((14.75, 25.623043888)):
            Circle(SKETCH_11_R, mode=Mode.SUBTRACT)
        with Locations((14.75, 35.623043888)):
            Circle(SKETCH_11_R, mode=Mode.SUBTRACT)
        with Locations((44.376956112, 45.25)):
            Circle(SKETCH_11_R, mode=Mode.SUBTRACT)
        with Locations((-77, 144)):
            Circle(SKETCH_11_R_2, mode=Mode.SUBTRACT)
        with Locations((-77, 16)):
            Circle(SKETCH_11_R_2, mode=Mode.SUBTRACT)
        with Locations((-77, 24)):
            Circle(SKETCH_11_R_2, mode=Mode.SUBTRACT)
        with Locations((-77, 32)):
            Circle(SKETCH_11_R_2, mode=Mode.SUBTRACT)
        with Locations((-77, 40)):
            Circle(SKETCH_11_R_2, mode=Mode.SUBTRACT)
        with Locations((-77, 48)):
            Circle(SKETCH_11_R_2, mode=Mode.SUBTRACT)
        with Locations((-77, 56)):
            Circle(SKETCH_11_R_2, mode=Mode.SUBTRACT)
        with Locations((-77, 64)):
            Circle(SKETCH_11_R_2, mode=Mode.SUBTRACT)
        with Locations((-77, 72)):
            Circle(SKETCH_11_R_2, mode=Mode.SUBTRACT)
        with Locations((-54.376956112, 65.25)):
            Circle(SKETCH_11_R, mode=Mode.SUBTRACT)
        with Locations((-44.376956112, 65.25)):
            Circle(SKETCH_11_R, mode=Mode.SUBTRACT)
        with Locations((-77, 80)):
            Circle(SKETCH_11_R_2, mode=Mode.SUBTRACT)
        with Locations((-77, 88)):
            Circle(SKETCH_11_R_2, mode=Mode.SUBTRACT)
        with Locations((-77, 96)):
            Circle(SKETCH_11_R_2, mode=Mode.SUBTRACT)
        with Locations((-77, 104)):
            Circle(SKETCH_11_R_2, mode=Mode.SUBTRACT)
        with Locations((-49.376956112, 90)):
            Rectangle(SKETCH_11_W, SKETCH_11_H, mode=Mode.SUBTRACT)
        with Locations((-77, 112)):
            Circle(SKETCH_11_R_2, mode=Mode.SUBTRACT)
        with Locations((-77, 120)):
            Circle(SKETCH_11_R_2, mode=Mode.SUBTRACT)
        with Locations((-77, 128)):
            Circle(SKETCH_11_R_2, mode=Mode.SUBTRACT)
        with Locations((-77, 136)):
            Circle(SKETCH_11_R_2, mode=Mode.SUBTRACT)
        with Locations((-54.376956112, 114.75)):
            Circle(SKETCH_11_R, mode=Mode.SUBTRACT)
        with Locations((-44.376956112, 114.75)):
            Circle(SKETCH_11_R, mode=Mode.SUBTRACT)
        with Locations((77, 144)):
            Circle(SKETCH_11_R_2, mode=Mode.SUBTRACT)
        with Locations((77, 136)):
            Circle(SKETCH_11_R_2, mode=Mode.SUBTRACT)
        with Locations((77, 128)):
            Circle(SKETCH_11_R_2, mode=Mode.SUBTRACT)
        with Locations((77, 16)):
            Circle(SKETCH_11_R_2, mode=Mode.SUBTRACT)
        with Locations((77, 24)):
            Circle(SKETCH_11_R_2, mode=Mode.SUBTRACT)
        with Locations((77, 32)):
            Circle(SKETCH_11_R_2, mode=Mode.SUBTRACT)
        with Locations((77, 40)):
            Circle(SKETCH_11_R_2, mode=Mode.SUBTRACT)
        with Locations((77, 48)):
            Circle(SKETCH_11_R_2, mode=Mode.SUBTRACT)
        with Locations((44.376956112, 94.75)):
            Circle(SKETCH_11_R, mode=Mode.SUBTRACT)
        with Locations((77, 56)):
            Circle(SKETCH_11_R_2, mode=Mode.SUBTRACT)
        with Locations((77, 64)):
            Circle(SKETCH_11_R_2, mode=Mode.SUBTRACT)
        with Locations((77, 72)):
            Circle(SKETCH_11_R_2, mode=Mode.SUBTRACT)
        with Locations((54.376956112, 94.75)):
            Circle(SKETCH_11_R, mode=Mode.SUBTRACT)
        with Locations((77, 80)):
            Circle(SKETCH_11_R_2, mode=Mode.SUBTRACT)
        with Locations((77, 88)):
            Circle(SKETCH_11_R_2, mode=Mode.SUBTRACT)
        with Locations((77, 96)):
            Circle(SKETCH_11_R_2, mode=Mode.SUBTRACT)
        with Locations((77, 104)):
            Circle(SKETCH_11_R_2, mode=Mode.SUBTRACT)
        with Locations((77, 112)):
            Circle(SKETCH_11_R_2, mode=Mode.SUBTRACT)
        with Locations((77, 120)):
            Circle(SKETCH_11_R_2, mode=Mode.SUBTRACT)
    extrude(amount=-CUT_EXTRUDE_7_DEPTH, mode=Mode.SUBTRACT)

    # 草图12 → 切除-拉伸8 (cut)
    with BuildSketch(Plane(origin=(0, 0, 0), x_dir=(-1, 0, 0), z_dir=(0, 0, -1))):
        with Locations((0, 3.5)):
            Rectangle(SKETCH_12_W, SKETCH_12_H)
    extrude(amount=-CUT_EXTRUDE_8_DEPTH, mode=Mode.SUBTRACT)


solid = part.part
